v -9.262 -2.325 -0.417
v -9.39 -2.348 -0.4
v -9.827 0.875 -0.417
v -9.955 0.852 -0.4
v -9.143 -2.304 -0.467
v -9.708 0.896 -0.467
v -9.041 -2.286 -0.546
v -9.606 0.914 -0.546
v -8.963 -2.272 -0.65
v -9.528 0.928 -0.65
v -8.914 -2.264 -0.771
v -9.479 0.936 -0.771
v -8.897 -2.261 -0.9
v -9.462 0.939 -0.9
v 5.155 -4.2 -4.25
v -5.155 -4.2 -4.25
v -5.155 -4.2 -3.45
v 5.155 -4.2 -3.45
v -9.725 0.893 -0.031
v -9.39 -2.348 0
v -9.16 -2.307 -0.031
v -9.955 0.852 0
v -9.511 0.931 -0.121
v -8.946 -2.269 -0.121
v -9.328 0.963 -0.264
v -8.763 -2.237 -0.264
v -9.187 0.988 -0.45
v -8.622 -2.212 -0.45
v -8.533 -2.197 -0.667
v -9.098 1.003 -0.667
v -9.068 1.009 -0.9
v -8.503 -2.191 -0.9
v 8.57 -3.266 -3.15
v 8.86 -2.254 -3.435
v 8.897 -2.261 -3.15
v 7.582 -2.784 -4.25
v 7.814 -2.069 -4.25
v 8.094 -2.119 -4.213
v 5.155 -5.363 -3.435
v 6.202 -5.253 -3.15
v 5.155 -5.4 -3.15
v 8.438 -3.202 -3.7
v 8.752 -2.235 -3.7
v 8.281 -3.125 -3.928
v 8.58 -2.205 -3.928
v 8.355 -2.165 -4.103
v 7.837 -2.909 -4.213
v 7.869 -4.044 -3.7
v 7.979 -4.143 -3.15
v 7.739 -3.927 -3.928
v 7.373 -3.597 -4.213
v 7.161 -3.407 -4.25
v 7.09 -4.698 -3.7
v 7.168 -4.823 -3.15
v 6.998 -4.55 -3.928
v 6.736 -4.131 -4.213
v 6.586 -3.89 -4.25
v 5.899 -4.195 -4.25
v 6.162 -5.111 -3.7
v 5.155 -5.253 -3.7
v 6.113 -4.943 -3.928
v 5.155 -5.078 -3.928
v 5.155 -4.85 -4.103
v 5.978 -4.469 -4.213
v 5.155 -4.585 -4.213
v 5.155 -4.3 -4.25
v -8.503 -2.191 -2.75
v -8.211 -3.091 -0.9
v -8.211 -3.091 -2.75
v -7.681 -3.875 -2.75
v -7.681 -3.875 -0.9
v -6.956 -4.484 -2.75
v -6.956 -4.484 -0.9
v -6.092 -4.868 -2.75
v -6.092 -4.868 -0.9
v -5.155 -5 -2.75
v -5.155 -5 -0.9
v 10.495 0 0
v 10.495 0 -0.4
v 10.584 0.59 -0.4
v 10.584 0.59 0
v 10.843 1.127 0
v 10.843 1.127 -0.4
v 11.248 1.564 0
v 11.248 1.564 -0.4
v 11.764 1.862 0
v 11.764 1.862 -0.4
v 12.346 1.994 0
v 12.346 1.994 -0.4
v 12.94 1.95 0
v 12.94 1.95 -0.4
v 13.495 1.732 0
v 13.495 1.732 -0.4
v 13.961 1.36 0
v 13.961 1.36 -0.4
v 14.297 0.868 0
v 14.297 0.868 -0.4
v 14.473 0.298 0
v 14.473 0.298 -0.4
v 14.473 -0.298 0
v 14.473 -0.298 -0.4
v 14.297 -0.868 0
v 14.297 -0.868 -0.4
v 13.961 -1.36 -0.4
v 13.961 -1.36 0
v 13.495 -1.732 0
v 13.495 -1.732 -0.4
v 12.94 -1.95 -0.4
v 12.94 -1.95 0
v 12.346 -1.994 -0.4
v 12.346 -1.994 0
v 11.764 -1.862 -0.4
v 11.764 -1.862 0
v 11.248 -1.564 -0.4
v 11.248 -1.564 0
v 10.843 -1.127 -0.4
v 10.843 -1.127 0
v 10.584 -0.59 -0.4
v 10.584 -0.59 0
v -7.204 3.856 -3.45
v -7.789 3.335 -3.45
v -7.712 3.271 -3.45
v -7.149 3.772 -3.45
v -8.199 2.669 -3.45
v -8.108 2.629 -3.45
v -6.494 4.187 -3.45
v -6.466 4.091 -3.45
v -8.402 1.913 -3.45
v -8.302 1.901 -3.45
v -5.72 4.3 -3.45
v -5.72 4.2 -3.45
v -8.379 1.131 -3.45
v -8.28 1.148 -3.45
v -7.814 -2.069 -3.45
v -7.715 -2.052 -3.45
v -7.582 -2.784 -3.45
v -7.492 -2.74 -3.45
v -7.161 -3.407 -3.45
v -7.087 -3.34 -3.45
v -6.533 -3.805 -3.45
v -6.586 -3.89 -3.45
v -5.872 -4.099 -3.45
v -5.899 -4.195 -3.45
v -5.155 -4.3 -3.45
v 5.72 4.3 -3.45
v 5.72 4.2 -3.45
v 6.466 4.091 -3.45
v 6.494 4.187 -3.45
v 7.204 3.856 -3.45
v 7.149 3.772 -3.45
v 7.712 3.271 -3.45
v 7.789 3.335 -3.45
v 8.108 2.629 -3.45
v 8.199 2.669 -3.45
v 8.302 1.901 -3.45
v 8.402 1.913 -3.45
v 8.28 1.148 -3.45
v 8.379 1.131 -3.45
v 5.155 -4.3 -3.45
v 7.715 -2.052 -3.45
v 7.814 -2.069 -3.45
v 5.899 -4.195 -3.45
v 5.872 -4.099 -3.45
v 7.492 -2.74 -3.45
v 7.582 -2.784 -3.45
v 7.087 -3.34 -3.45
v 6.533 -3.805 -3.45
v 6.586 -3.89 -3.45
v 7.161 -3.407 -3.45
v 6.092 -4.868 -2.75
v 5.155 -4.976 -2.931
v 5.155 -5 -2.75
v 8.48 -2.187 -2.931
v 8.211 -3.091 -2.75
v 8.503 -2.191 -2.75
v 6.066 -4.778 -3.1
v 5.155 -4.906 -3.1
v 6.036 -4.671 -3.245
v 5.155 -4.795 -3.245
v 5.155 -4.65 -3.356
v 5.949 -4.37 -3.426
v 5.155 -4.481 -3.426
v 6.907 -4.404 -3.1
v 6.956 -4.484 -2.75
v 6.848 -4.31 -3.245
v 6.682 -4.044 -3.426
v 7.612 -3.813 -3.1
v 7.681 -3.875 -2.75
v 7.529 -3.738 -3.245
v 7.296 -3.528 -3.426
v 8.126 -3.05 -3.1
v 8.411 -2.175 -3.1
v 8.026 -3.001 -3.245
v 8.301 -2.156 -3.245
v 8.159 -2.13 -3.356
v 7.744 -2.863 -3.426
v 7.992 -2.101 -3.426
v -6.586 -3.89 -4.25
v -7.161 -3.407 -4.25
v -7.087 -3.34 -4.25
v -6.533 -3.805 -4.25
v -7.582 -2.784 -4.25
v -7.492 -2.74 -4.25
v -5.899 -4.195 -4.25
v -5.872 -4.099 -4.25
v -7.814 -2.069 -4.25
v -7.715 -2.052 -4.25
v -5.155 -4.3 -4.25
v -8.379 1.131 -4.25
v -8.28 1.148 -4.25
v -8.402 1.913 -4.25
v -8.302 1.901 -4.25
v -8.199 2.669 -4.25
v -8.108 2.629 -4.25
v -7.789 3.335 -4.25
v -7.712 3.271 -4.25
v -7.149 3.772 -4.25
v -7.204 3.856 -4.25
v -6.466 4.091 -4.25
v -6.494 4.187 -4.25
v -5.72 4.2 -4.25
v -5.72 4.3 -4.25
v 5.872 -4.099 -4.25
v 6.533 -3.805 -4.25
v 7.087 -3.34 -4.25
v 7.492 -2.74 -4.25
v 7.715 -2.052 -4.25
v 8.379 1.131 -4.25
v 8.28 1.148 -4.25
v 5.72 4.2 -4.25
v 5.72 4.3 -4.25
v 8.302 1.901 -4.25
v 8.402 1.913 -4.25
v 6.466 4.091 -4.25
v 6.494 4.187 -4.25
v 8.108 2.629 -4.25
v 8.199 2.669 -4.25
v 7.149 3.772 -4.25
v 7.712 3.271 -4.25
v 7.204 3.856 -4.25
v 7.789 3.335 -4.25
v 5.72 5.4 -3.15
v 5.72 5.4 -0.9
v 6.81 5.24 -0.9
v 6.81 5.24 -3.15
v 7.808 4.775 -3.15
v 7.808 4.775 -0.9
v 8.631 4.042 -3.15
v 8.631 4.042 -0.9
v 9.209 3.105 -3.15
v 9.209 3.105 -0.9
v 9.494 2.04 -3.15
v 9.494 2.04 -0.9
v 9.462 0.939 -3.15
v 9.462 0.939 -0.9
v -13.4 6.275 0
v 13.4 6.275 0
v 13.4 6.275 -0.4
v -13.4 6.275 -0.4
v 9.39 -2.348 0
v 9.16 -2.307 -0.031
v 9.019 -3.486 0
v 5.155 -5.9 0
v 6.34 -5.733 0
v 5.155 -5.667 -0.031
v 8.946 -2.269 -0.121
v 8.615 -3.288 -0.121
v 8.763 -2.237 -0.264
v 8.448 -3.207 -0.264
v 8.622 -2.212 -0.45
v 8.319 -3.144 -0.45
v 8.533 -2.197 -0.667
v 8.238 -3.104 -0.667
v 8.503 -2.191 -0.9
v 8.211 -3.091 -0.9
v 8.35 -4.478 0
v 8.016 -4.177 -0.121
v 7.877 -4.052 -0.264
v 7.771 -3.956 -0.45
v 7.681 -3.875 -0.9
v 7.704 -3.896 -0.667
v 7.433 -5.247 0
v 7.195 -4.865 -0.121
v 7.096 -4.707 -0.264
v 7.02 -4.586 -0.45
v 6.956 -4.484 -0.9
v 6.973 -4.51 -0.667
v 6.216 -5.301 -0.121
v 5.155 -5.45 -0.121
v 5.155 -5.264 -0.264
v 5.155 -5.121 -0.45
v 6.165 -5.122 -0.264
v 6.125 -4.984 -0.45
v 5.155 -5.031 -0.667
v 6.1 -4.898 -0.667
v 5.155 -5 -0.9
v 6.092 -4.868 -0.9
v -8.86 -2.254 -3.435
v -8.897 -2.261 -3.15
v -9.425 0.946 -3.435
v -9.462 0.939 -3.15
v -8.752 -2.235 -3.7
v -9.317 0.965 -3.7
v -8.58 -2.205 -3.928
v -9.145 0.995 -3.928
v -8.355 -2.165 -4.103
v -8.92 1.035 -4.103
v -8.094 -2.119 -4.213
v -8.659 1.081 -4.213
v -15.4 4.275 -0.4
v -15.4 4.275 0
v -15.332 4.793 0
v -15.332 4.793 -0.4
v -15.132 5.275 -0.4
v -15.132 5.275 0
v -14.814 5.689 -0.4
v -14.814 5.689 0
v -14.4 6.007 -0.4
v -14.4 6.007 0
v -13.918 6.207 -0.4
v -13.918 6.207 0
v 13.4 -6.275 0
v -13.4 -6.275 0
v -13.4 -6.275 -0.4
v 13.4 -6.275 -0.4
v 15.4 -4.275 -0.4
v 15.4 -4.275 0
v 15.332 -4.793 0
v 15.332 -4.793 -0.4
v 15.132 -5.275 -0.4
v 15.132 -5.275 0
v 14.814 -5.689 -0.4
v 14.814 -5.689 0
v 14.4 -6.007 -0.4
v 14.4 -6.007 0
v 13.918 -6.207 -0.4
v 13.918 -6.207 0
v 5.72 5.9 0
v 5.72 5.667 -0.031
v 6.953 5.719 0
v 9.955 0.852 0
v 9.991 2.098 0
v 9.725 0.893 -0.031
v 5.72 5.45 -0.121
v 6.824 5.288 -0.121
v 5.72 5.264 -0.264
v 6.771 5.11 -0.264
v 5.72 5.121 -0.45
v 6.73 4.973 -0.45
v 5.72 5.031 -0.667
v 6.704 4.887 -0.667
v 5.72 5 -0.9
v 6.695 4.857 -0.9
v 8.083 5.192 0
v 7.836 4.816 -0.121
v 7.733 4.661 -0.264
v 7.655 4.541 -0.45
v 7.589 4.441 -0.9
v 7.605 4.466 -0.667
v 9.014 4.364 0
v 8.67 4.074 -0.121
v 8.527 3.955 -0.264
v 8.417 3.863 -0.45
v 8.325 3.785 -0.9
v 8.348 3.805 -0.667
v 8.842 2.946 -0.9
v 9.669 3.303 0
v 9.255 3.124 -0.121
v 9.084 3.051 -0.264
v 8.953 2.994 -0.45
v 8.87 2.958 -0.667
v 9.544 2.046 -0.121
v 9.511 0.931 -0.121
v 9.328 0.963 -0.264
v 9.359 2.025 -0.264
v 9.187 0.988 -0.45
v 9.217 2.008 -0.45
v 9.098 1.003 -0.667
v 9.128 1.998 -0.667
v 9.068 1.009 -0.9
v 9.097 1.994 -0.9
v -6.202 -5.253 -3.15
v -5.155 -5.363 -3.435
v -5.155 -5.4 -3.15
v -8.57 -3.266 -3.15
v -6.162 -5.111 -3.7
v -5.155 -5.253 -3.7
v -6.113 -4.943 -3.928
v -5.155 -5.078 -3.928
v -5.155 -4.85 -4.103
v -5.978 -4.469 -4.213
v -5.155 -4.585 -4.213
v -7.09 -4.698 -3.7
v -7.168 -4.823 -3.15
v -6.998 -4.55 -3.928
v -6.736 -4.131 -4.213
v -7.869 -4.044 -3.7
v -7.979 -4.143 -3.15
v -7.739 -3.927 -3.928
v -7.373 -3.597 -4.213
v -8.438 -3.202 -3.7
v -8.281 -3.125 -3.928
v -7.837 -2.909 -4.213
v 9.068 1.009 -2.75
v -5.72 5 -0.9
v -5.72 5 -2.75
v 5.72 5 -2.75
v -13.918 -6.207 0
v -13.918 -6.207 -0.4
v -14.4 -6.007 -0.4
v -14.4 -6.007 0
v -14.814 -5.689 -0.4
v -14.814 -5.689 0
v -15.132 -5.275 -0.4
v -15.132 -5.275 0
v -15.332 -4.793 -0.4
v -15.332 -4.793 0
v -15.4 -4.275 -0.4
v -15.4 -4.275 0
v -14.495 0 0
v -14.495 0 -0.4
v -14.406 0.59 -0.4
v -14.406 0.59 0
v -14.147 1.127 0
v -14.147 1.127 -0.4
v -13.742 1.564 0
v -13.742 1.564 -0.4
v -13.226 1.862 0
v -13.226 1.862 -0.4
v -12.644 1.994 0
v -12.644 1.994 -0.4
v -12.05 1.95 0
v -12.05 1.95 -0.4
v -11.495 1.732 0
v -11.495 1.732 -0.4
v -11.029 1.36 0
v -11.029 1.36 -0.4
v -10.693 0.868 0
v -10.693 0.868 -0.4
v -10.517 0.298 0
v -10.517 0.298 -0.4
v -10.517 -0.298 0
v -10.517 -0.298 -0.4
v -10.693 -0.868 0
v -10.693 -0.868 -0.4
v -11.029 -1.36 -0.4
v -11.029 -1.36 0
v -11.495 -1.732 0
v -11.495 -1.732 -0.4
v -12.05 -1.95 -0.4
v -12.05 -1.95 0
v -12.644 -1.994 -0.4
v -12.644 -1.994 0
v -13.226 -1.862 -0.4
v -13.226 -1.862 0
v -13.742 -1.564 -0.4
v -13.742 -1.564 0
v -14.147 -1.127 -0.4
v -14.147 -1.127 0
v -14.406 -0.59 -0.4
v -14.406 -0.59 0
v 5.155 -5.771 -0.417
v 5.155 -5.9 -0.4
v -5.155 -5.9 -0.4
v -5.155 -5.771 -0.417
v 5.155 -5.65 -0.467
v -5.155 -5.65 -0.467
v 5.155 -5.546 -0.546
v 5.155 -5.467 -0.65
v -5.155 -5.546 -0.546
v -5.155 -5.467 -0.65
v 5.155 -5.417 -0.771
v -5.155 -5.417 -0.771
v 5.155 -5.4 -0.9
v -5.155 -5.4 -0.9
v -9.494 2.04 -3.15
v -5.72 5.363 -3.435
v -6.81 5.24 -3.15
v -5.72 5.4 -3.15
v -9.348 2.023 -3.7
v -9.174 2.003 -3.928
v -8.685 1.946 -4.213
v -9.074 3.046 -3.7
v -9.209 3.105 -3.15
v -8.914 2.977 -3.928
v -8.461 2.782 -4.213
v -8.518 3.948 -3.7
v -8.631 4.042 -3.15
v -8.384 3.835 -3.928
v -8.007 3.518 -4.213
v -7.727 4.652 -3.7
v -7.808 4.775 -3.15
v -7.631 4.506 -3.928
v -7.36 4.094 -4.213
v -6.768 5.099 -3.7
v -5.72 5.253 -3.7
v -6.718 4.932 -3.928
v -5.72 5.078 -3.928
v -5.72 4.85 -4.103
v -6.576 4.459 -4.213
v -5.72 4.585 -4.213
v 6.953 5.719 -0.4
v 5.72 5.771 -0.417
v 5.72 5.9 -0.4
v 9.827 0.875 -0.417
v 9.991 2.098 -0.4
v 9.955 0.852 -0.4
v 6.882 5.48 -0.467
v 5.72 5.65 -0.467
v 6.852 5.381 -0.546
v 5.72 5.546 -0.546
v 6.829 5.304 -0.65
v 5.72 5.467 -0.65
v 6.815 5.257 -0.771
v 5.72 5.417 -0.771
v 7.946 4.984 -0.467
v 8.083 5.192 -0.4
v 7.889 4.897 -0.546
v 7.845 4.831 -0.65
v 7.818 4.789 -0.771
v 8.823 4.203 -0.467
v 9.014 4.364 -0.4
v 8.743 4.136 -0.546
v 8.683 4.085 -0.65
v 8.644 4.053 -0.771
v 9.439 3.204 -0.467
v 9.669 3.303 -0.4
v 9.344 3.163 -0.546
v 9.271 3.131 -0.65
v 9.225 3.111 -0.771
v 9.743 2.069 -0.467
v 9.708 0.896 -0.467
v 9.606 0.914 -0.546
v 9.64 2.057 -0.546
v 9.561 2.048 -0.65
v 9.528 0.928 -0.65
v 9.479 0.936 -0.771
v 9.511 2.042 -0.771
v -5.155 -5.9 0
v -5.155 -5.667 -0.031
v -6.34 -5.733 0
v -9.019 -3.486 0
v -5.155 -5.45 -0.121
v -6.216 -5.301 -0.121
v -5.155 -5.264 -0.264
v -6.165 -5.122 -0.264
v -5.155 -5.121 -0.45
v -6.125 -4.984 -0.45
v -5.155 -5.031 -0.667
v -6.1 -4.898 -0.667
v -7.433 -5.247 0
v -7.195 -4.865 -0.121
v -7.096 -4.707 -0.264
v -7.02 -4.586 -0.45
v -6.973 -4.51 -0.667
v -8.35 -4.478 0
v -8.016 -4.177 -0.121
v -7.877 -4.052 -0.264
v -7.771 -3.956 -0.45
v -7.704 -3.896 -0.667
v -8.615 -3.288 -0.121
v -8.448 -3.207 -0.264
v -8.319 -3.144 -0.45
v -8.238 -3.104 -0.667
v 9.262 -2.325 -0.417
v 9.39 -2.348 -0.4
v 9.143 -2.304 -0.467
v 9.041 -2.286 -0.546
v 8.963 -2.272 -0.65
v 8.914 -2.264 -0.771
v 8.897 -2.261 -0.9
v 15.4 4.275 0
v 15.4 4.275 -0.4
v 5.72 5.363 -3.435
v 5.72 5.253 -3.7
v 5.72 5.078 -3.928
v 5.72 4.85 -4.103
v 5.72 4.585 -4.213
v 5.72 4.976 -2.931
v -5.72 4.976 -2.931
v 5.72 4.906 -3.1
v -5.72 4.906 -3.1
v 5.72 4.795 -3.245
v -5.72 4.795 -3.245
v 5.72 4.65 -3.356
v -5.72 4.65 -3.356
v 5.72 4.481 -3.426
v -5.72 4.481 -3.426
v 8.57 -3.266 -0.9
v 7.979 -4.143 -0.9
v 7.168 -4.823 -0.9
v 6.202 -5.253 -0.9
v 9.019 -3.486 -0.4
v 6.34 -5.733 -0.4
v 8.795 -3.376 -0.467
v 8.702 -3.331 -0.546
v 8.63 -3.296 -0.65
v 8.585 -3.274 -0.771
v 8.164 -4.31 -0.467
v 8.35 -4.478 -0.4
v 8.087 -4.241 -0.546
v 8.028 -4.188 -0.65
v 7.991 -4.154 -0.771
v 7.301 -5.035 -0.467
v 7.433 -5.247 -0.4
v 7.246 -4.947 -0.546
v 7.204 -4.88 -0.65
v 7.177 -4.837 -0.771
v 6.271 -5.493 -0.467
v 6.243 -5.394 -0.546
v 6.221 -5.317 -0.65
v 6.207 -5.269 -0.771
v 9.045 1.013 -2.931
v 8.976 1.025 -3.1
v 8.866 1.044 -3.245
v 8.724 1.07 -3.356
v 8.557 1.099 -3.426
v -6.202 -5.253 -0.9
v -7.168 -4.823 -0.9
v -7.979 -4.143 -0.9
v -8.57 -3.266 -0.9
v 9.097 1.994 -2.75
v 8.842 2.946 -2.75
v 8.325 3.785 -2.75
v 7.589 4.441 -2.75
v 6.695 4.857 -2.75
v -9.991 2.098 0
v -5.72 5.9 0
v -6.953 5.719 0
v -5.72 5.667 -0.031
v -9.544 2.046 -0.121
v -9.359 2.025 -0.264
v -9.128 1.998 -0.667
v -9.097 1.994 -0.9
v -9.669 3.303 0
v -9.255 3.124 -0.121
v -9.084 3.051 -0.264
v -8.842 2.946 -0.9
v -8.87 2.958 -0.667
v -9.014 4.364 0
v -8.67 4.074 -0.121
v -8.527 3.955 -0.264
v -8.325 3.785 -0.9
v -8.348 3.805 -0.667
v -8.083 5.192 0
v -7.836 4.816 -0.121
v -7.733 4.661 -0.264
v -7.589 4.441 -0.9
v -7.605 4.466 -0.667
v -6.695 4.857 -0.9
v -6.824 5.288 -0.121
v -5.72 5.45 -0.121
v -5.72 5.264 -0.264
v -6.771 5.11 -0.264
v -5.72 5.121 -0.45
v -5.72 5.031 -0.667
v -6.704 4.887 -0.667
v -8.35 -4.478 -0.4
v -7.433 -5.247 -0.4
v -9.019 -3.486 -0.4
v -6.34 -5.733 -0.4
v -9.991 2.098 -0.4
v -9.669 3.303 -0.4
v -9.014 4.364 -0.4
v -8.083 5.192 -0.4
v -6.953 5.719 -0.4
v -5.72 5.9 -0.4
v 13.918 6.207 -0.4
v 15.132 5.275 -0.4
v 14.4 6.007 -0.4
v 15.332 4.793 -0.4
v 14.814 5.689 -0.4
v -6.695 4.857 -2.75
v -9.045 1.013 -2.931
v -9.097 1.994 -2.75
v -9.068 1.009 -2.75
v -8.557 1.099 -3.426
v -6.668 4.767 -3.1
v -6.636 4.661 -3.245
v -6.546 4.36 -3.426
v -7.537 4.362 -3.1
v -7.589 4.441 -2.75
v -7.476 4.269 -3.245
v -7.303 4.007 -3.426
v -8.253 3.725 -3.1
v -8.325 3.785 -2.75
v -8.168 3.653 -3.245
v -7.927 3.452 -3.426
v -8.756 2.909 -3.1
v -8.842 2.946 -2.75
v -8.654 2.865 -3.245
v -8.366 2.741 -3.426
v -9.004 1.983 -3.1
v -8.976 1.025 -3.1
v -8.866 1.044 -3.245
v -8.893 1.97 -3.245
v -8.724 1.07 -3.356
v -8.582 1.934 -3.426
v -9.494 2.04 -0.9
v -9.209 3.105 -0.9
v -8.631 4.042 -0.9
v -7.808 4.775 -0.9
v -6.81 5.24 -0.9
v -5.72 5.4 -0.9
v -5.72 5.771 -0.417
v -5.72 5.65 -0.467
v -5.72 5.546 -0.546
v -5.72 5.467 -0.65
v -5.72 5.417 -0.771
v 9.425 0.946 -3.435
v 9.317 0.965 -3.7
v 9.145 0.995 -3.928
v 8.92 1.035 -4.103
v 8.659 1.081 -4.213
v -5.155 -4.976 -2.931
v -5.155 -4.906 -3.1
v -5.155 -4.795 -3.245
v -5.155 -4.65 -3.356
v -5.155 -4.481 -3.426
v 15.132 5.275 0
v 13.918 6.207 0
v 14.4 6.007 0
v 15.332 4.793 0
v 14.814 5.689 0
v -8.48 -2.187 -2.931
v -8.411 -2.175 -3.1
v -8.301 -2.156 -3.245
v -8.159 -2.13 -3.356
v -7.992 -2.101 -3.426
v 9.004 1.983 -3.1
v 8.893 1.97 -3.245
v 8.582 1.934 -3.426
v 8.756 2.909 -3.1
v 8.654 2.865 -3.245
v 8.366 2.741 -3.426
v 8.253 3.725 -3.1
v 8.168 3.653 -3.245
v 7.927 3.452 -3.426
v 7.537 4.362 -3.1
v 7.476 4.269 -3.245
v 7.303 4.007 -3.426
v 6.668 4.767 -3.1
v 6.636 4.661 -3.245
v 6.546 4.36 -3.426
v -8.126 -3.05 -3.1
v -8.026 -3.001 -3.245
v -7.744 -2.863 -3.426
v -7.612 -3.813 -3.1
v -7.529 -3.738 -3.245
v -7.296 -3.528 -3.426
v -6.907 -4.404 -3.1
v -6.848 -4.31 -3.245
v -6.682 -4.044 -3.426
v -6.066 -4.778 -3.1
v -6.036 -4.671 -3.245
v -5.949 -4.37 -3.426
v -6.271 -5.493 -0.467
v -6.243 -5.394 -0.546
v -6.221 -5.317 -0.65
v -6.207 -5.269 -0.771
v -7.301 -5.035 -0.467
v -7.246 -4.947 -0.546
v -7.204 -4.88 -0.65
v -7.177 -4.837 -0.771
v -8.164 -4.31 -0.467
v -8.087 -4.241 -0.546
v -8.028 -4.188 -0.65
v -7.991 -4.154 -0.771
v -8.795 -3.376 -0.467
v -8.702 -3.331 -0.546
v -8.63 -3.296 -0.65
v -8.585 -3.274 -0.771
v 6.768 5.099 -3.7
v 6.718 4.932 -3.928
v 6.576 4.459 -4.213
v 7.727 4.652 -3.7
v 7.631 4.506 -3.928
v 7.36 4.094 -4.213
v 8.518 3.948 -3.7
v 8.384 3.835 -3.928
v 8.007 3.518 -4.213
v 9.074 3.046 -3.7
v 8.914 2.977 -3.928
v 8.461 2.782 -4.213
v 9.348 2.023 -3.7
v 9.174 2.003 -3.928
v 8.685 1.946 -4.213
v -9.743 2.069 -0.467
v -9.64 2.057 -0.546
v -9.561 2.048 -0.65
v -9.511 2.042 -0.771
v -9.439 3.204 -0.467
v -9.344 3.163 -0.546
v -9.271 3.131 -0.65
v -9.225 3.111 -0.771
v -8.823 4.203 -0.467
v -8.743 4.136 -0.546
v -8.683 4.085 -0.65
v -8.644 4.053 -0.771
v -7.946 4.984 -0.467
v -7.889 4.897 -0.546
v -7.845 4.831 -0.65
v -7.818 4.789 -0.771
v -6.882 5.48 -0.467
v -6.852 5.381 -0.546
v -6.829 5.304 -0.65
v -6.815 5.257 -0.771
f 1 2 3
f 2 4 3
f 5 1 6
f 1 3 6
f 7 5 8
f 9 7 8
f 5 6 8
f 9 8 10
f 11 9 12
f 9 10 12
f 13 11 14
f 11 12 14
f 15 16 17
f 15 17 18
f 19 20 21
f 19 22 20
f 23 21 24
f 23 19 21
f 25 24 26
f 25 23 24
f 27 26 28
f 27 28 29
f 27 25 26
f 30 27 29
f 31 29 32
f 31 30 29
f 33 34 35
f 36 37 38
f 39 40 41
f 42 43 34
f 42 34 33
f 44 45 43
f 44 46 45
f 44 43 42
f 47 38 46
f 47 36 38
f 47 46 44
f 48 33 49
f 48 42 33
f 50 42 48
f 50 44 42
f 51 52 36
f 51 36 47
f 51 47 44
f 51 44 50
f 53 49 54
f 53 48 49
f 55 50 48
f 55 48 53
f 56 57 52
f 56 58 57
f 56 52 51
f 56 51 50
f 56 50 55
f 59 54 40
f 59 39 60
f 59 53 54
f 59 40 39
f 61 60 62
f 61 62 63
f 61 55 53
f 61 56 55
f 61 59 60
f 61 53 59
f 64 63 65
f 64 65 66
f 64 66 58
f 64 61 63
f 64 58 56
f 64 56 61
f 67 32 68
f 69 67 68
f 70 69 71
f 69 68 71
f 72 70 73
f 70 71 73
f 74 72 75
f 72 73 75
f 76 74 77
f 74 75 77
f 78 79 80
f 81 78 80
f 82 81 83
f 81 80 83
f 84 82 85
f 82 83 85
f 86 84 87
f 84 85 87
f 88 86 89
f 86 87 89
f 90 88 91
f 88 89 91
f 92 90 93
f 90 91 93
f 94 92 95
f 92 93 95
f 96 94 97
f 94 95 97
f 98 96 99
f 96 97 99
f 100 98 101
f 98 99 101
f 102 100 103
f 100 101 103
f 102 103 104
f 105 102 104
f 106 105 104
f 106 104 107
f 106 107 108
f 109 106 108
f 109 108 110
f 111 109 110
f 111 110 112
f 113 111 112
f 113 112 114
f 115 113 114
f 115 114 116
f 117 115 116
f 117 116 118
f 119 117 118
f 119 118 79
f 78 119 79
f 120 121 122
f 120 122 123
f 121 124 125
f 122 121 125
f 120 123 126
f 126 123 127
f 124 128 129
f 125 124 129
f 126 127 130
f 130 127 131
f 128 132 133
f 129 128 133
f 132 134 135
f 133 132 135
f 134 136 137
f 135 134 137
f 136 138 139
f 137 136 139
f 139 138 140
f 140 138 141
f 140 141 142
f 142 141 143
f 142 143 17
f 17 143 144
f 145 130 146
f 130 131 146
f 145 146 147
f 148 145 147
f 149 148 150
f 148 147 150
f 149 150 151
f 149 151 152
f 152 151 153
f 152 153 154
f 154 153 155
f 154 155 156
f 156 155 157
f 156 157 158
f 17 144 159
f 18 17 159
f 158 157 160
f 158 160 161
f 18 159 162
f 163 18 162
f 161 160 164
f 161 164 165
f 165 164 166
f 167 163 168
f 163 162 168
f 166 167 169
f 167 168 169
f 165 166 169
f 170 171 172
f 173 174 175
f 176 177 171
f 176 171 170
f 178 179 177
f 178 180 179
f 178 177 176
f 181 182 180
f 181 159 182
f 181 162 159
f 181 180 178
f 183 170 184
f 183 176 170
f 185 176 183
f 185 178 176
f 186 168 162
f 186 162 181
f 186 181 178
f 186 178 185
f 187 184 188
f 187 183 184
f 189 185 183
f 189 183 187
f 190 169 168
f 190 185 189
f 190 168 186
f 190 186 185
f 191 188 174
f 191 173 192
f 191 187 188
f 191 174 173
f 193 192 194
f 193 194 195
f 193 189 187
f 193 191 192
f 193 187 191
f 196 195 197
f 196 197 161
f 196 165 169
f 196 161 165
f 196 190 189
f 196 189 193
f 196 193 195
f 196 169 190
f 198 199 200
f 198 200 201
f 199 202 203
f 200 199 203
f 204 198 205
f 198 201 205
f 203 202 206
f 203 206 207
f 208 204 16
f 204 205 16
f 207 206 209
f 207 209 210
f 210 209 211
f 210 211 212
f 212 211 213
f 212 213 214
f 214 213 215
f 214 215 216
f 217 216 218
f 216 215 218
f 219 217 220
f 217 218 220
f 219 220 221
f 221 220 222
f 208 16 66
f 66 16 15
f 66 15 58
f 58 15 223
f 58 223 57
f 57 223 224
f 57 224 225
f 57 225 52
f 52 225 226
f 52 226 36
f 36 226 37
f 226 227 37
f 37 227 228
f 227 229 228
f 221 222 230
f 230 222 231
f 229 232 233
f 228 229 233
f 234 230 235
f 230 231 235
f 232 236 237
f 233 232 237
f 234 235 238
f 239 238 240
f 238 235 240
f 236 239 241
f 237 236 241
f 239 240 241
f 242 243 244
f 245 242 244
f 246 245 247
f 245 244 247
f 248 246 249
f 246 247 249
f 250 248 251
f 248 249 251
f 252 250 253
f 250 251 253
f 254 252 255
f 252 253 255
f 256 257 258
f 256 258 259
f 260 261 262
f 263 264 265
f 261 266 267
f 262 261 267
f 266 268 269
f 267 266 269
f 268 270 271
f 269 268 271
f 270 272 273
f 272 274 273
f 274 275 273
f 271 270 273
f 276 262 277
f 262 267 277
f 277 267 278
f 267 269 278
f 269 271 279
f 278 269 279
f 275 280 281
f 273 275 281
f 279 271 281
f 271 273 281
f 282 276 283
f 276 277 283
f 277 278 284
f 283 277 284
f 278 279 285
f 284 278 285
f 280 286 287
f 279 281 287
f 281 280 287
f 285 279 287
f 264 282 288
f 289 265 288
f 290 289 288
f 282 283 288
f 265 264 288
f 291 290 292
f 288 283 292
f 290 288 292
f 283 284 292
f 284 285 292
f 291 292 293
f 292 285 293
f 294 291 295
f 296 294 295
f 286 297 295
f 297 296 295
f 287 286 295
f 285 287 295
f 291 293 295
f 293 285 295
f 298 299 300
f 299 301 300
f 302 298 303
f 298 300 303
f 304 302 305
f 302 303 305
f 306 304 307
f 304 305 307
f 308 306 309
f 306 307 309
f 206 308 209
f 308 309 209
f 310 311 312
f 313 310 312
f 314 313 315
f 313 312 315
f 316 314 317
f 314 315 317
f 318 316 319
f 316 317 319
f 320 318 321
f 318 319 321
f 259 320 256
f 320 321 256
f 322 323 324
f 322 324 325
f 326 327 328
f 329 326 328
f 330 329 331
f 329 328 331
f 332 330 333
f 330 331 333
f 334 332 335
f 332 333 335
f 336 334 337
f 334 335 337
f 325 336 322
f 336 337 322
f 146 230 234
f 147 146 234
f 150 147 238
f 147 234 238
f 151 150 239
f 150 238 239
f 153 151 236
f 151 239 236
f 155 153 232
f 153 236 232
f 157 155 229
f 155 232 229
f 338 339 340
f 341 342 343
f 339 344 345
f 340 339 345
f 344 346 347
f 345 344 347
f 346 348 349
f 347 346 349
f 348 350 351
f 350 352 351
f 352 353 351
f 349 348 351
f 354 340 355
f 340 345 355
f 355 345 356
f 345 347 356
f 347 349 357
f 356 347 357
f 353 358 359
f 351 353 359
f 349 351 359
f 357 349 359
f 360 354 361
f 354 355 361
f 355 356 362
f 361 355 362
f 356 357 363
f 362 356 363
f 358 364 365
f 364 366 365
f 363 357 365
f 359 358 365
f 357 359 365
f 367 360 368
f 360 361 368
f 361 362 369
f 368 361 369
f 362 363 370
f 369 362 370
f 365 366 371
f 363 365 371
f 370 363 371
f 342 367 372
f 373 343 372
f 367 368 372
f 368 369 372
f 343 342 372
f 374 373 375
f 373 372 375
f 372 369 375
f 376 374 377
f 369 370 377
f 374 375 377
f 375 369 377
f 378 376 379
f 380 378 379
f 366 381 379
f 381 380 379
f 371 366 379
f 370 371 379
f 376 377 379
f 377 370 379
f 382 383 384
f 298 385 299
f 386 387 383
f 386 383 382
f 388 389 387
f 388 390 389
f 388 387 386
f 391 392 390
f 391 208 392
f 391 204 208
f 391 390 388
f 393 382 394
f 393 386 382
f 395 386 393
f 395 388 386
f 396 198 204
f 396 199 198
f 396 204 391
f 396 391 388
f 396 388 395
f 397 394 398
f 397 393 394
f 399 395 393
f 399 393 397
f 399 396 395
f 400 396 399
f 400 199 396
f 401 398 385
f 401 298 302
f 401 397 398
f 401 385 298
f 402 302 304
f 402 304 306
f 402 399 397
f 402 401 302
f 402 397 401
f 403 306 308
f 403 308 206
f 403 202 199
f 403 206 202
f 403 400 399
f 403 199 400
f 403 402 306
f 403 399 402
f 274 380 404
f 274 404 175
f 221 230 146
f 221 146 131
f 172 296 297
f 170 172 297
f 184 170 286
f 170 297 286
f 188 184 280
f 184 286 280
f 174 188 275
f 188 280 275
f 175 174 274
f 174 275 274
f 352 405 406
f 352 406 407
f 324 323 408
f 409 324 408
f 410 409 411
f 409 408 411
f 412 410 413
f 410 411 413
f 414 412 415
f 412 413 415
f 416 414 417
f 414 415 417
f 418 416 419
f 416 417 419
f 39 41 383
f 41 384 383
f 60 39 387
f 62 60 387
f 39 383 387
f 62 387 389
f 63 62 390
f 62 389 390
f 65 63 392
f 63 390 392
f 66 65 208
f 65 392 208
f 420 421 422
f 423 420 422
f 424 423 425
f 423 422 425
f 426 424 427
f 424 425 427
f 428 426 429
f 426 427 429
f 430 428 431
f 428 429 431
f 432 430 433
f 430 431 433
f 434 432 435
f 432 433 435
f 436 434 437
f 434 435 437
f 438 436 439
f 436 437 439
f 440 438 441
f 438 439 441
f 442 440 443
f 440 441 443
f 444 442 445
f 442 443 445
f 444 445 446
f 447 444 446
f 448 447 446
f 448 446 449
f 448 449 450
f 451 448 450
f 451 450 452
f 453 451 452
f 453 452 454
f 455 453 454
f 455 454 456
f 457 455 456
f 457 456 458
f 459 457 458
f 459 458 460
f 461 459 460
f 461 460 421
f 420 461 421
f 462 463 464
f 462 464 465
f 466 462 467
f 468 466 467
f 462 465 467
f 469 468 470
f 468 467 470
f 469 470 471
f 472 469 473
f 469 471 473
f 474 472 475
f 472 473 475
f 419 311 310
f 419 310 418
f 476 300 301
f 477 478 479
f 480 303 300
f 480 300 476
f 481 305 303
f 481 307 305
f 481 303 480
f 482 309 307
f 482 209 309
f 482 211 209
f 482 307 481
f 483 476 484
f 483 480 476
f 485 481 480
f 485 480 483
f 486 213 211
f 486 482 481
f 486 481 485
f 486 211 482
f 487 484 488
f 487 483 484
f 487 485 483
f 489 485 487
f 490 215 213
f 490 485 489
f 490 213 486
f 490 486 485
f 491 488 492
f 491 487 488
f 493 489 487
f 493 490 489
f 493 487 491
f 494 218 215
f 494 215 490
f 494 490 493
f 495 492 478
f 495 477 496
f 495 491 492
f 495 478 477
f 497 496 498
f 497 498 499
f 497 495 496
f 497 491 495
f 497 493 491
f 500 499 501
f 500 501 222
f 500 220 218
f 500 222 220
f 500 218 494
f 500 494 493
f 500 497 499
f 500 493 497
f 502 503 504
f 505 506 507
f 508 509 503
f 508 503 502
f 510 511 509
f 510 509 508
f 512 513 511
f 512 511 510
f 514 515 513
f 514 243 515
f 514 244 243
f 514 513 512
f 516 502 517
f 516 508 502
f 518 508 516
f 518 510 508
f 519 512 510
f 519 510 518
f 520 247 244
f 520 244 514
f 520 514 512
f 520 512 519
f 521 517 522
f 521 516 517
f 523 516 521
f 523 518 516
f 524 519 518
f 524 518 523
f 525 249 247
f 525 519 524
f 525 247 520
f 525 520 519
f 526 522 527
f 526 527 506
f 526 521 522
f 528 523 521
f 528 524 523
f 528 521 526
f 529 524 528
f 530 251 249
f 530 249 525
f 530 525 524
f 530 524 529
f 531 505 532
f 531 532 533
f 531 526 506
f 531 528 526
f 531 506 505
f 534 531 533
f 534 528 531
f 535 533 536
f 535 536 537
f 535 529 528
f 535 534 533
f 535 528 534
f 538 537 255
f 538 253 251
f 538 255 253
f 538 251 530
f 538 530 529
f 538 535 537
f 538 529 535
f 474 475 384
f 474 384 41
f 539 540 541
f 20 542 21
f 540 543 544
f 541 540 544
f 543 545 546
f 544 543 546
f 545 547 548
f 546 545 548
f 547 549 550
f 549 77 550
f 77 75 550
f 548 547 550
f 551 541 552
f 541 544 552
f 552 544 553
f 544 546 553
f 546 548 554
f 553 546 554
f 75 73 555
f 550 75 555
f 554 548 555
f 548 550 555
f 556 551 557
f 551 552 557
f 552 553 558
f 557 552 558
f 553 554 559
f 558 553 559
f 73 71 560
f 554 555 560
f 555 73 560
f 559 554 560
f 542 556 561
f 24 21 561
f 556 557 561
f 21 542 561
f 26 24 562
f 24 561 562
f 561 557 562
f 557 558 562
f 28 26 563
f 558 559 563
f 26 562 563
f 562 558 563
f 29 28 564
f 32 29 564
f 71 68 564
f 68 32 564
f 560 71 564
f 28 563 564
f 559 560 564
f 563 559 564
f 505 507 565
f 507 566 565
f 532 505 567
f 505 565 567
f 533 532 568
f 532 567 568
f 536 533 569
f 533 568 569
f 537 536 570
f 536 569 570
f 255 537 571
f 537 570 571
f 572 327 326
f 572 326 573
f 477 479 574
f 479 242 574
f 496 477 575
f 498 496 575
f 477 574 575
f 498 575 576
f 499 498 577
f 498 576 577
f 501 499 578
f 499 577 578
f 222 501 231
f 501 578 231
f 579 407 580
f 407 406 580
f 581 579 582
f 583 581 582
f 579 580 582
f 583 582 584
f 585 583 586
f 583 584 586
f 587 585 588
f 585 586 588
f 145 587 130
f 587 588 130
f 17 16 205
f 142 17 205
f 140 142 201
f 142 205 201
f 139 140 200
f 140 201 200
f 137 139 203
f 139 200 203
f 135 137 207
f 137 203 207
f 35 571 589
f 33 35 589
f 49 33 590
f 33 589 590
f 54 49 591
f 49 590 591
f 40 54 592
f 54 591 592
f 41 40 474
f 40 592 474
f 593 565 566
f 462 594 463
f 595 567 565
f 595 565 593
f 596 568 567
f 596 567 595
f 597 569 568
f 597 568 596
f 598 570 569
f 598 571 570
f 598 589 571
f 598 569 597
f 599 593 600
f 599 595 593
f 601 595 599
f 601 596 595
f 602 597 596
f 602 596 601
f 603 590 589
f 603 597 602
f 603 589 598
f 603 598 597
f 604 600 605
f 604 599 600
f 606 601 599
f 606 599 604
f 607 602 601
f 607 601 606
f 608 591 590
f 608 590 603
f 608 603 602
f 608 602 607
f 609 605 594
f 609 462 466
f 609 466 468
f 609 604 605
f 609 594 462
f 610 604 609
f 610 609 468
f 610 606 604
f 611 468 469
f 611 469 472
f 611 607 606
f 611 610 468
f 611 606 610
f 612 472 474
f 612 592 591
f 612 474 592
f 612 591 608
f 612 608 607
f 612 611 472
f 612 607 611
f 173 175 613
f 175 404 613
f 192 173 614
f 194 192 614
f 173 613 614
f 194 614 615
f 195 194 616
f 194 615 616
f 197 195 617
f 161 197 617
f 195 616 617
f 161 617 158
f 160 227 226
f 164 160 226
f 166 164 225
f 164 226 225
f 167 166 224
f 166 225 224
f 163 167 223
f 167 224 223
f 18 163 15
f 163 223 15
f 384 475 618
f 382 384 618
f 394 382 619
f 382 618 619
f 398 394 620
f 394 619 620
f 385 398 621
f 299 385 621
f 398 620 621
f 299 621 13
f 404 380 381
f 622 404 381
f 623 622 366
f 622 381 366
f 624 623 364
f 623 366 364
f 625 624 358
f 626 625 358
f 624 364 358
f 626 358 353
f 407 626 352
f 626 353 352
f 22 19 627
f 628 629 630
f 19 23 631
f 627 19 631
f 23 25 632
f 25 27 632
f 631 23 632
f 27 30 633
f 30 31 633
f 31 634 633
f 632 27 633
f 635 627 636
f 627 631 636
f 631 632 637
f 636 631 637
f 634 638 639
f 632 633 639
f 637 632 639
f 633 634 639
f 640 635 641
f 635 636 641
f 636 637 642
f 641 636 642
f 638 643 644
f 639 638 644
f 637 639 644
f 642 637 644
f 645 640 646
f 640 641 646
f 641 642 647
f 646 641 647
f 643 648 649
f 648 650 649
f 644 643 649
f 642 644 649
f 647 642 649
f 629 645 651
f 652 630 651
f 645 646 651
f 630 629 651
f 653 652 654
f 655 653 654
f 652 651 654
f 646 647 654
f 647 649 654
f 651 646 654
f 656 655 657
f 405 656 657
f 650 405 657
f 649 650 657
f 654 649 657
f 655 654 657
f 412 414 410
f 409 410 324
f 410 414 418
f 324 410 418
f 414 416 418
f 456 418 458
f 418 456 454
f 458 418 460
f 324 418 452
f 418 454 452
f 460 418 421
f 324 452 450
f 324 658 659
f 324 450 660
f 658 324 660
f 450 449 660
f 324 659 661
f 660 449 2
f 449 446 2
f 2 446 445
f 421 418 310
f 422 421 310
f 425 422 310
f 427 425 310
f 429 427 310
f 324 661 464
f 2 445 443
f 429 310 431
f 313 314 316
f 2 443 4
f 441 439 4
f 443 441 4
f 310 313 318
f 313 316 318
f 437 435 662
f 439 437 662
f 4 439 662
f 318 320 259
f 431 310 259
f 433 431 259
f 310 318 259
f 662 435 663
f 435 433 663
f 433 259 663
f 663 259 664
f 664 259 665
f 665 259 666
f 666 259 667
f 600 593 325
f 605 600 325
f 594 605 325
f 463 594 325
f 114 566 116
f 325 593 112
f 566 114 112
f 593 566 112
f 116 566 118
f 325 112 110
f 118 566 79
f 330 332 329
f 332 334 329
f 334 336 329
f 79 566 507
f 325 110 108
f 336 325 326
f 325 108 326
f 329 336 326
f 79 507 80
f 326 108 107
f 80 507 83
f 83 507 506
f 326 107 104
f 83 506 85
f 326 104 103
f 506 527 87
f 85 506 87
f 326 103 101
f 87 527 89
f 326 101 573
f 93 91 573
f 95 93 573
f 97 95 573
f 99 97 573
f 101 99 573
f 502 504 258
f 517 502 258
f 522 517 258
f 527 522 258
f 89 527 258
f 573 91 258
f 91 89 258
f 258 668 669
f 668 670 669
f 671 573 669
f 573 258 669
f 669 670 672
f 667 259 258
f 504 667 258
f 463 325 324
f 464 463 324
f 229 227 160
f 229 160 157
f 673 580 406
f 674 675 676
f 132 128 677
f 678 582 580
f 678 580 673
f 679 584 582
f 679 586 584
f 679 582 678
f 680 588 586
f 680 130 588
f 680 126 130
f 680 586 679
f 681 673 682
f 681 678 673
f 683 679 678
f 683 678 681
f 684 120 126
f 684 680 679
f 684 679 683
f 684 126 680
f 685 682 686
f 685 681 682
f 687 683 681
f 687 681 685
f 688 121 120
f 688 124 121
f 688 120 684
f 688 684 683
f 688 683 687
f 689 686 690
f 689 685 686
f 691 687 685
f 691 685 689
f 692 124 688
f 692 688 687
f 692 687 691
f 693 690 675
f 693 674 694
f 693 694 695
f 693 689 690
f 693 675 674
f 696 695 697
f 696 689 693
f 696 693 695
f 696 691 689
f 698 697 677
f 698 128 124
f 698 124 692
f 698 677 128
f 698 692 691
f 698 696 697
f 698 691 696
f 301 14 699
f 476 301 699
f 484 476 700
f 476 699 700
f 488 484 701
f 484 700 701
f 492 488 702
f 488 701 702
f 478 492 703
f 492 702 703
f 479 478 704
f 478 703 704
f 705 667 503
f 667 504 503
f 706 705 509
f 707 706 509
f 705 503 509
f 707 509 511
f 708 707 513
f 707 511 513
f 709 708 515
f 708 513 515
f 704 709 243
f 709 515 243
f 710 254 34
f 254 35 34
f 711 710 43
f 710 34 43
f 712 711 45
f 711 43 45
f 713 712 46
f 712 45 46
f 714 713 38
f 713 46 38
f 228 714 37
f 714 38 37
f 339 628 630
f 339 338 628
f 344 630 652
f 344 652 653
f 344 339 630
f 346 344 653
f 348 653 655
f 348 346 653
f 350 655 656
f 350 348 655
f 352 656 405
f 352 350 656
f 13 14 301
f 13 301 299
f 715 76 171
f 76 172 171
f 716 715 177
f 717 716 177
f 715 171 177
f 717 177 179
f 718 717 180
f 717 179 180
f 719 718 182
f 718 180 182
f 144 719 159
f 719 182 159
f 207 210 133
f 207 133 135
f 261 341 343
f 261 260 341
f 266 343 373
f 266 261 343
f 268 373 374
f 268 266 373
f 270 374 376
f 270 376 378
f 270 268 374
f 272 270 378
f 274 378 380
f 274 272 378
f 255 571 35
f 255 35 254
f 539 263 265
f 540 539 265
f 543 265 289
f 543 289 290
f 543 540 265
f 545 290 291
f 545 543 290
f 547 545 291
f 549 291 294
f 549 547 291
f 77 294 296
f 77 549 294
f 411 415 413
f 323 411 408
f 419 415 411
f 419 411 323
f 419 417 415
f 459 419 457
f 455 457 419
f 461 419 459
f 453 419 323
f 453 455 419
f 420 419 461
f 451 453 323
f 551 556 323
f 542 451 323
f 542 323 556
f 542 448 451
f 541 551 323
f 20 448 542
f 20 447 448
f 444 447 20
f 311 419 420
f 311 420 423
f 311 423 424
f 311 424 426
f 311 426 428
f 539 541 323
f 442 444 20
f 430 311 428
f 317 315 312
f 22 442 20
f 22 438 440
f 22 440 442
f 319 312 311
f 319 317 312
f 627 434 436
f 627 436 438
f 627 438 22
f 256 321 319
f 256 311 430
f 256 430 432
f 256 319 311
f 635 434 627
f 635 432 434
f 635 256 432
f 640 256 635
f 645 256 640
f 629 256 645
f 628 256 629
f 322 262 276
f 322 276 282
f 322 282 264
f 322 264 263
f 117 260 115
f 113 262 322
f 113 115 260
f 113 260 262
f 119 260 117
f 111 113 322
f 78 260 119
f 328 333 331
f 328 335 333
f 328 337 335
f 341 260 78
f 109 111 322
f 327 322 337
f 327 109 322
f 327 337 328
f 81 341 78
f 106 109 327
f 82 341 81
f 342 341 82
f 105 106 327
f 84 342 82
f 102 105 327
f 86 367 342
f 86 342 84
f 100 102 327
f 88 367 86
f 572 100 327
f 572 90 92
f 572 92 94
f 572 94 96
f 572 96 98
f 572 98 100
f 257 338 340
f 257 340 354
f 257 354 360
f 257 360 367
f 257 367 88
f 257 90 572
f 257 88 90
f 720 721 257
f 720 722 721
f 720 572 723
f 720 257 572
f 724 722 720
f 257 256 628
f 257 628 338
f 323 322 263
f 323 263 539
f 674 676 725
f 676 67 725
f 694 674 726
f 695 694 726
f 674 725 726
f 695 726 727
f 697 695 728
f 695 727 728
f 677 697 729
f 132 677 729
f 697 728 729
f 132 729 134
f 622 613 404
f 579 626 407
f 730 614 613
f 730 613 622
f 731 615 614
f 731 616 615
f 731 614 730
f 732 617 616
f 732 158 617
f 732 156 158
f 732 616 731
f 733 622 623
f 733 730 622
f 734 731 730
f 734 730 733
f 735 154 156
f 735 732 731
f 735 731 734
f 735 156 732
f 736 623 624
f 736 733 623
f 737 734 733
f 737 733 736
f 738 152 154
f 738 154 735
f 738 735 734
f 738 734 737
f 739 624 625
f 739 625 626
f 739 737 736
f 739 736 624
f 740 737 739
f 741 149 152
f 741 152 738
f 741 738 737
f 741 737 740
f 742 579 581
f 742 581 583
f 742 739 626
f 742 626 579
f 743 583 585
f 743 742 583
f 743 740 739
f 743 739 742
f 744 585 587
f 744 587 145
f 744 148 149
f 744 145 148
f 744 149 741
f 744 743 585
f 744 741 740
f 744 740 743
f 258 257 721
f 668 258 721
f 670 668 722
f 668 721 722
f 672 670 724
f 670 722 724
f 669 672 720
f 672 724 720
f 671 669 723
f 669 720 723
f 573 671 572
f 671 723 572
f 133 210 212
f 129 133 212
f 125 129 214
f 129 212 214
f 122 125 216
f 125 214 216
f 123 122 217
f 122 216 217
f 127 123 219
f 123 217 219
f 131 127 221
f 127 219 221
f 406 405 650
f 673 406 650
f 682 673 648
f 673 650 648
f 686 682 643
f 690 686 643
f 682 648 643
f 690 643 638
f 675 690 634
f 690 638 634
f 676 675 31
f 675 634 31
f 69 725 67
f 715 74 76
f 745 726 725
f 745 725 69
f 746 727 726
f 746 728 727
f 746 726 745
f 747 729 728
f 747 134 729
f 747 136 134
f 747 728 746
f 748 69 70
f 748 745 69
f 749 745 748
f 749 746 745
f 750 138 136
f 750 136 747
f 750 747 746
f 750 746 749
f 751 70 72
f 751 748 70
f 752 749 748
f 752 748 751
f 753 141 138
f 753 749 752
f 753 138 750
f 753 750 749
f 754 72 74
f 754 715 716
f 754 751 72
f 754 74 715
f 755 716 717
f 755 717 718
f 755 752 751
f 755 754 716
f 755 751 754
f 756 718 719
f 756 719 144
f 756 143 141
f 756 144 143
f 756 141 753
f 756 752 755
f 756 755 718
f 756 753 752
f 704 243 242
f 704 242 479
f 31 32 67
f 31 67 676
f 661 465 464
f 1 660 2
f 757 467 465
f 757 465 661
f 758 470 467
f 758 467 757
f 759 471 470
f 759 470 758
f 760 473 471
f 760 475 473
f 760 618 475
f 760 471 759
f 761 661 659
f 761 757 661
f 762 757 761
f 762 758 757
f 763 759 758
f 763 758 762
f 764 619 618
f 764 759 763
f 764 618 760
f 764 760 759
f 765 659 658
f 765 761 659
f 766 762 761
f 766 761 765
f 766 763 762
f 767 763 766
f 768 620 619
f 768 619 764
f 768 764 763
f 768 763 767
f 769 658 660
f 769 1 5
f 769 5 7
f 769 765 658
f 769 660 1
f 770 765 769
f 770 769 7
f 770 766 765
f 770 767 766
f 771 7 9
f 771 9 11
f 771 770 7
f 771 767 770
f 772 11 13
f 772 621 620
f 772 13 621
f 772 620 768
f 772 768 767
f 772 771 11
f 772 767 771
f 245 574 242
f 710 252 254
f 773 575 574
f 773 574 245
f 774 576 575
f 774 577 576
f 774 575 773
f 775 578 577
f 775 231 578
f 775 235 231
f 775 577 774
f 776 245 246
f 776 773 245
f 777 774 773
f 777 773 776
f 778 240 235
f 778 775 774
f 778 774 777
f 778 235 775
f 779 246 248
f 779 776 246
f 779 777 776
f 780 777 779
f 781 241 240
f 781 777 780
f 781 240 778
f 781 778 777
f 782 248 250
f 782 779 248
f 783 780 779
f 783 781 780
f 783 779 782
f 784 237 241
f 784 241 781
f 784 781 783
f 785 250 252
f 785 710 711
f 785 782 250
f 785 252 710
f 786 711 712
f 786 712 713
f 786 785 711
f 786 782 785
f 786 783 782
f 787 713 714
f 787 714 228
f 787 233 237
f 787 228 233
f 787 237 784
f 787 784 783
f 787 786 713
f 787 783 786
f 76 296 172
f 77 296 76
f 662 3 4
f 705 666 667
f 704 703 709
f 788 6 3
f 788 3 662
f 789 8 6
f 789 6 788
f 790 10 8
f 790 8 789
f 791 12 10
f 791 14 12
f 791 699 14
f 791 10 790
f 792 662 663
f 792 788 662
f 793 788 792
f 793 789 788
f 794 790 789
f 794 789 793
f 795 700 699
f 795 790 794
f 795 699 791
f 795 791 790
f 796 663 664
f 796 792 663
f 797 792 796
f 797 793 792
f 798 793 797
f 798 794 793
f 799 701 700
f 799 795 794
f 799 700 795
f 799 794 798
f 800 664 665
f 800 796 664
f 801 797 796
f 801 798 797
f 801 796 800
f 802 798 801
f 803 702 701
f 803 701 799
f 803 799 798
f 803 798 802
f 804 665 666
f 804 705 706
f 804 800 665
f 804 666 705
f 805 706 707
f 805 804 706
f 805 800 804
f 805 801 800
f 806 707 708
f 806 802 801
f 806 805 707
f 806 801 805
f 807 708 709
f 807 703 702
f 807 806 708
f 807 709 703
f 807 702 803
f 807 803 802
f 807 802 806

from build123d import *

# Parameters (mm, degrees)
PAD002_DEPTH            = 0.4
SKETCH005_R             = 2
POCKET002_DEPTH         = 5
PAD003_DEPTH            = 3.85
POCKET003_DEPTH         = 4.251
POCKET004_DEPTH         = 3.45
FILLET003_R             = 0.7
FILLET004_R             = 0.5
FILLET005_R             = 1.1
FILLET006_R             = 0.9
BODY001_PLACEMENT_ANGLE = 180


with BuildPart() as part:
    # Sketch004 → Pad002 (new body)
    with BuildSketch(Plane.XY):
        with BuildLine():
            Line((-13.4, 6.275), (13.4, 6.275))
            ThreePointArc((15.4, 4.275), (14.814214, 5.689214), (13.4, 6.275))
            Line((15.4, 4.275), (15.4, -4.275))
            ThreePointArc((13.4, -6.275), (14.814214, -5.689214), (15.4, -4.275))
            Line((13.4, -6.275), (-13.4, -6.275))
            ThreePointArc((-15.4, -4.275), (-14.814214, -5.689214), (-13.4, -6.275))
            Line((-15.4, -4.275), (-15.4, 4.275))
            ThreePointArc((-13.4, 6.275), (-14.814214, 5.689214), (-15.4, 4.275))
        make_face()
    extrude(amount=PAD002_DEPTH)

    # Sketch005 (on Face10 of Pad002) → Pocket002 (cut)
    with BuildSketch(Plane.XY.offset(0.4)):
        with Locations((-12.495, 0)):
            Circle(SKETCH005_R)
        with Locations((12.495, 0)):
            Circle(SKETCH005_R)
    extrude(amount=-POCKET002_DEPTH, mode=Mode.SUBTRACT)

    # Sketch006 (on Face5 of Pocket002) → Pad003 (join)
    with BuildSketch(Plane.XY.offset(0.4)):
        with BuildLine():
            Line((-5.72, 5.4), (5.72, 5.4))
            ThreePointArc((9.462119, 0.939282), (8.631248, 4.04226), (5.72, 5.4))
            Line((9.462119, 0.939282), (8.897119, -2.260718))
            ThreePointArc((5.155, -5.4), (7.59726, -4.511248), (8.897119, -2.260718))
            Line((5.155, -5.4), (-5.155, -5.4))
            ThreePointArc((-8.897119, -2.260718), (-7.59726, -4.511248), (-5.155, -5.4))
            Line((-8.897119, -2.260718), (-9.462119, 0.939282))
            ThreePointArc((-5.72, 5.4), (-8.631248, 4.04226), (-9.462119, 0.939282))
        make_face()
    extrude(amount=PAD003_DEPTH)

    # Sketch007 (on Face21 of Pad003) → Pocket003 (cut, through all)
    with BuildSketch(Plane.XY.offset(4.25)):
        with BuildLine():
            Line((-5.72, 4.2), (5.72, 4.2))
            ThreePointArc((8.280397, 1.14793), (7.711906, 3.27102), (5.72, 4.2))
            Line((8.280397, 1.14793), (7.715397, -2.05207))
            ThreePointArc((5.155, -4.2), (6.82602, -3.591906), (7.715397, -2.05207))
            Line((5.155, -4.2), (-5.155, -4.2))
            ThreePointArc((-7.715397, -2.05207), (-6.82602, -3.591906), (-5.155, -4.2))
            Line((-7.715397, -2.05207), (-8.280397, 1.14793))
            ThreePointArc((-5.72, 4.2), (-7.711906, 3.27102), (-8.280397, 1.14793))
        make_face()
    extrude(amount=-POCKET003_DEPTH, mode=Mode.SUBTRACT)

    # Sketch008 (on Face4 of Pocket003) → Pocket004 (cut)
    with BuildSketch(Plane(origin=(0, 0, 0), x_dir=(1, 0, 0), z_dir=(0, 0, -1))):
        with BuildLine():
            Line((-5.155, 5), (5.155, 5))
            ThreePointArc((8.503211, 2.191169), (7.34018, 4.204801), (5.155, 5))
            Line((8.503211, 2.191169), (9.068211, -1.008831))
            ThreePointArc((5.72, -5), (8.324801, -3.78518), (9.068211, -1.008831))
            Line((5.72, -5), (-5.72, -5))
            ThreePointArc((-9.068211, -1.008831), (-8.324801, -3.78518), (-5.72, -5))
            Line((-9.068211, -1.008831), (-8.503211, 2.191169))
            ThreePointArc((-5.155, 5), (-7.34018, 4.204801), (-8.503211, 2.191169))
        make_face()
    extrude(amount=-POCKET004_DEPTH, mode=Mode.SUBTRACT)

    # Fillet003
    fillet003_edges = [part.edges().sort_by_distance(p)[0] for p in [
        (8.324801, 3.78518, 3.45),
    ]]
    fillet(fillet003_edges, radius=FILLET003_R)

    # Fillet004
    fillet004_edges = [part.edges().sort_by_distance(p)[0] for p in [
        (8.631248, 4.04226, 0.4),
    ]]
    fillet(fillet004_edges, radius=FILLET004_R)

    # Fillet005
    fillet005_edges = [part.edges().sort_by_distance(p)[0] for p in [
        (8.631248, 4.04226, 4.25),
    ]]
    fillet(fillet005_edges, radius=FILLET005_R)

    # Fillet006
    fillet006_edges = [part.edges().sort_by_distance(p)[0] for p in [
        (0, 5, 0),
    ]]
    fillet(fillet006_edges, radius=FILLET006_R)


with BuildPart() as part_1:
    # Body001 placement: moved
    add(part.part.rotate(Axis((0, 0, 0), (0, 1, 0)), BODY001_PLACEMENT_ANGLE))


solid = part_1.part
